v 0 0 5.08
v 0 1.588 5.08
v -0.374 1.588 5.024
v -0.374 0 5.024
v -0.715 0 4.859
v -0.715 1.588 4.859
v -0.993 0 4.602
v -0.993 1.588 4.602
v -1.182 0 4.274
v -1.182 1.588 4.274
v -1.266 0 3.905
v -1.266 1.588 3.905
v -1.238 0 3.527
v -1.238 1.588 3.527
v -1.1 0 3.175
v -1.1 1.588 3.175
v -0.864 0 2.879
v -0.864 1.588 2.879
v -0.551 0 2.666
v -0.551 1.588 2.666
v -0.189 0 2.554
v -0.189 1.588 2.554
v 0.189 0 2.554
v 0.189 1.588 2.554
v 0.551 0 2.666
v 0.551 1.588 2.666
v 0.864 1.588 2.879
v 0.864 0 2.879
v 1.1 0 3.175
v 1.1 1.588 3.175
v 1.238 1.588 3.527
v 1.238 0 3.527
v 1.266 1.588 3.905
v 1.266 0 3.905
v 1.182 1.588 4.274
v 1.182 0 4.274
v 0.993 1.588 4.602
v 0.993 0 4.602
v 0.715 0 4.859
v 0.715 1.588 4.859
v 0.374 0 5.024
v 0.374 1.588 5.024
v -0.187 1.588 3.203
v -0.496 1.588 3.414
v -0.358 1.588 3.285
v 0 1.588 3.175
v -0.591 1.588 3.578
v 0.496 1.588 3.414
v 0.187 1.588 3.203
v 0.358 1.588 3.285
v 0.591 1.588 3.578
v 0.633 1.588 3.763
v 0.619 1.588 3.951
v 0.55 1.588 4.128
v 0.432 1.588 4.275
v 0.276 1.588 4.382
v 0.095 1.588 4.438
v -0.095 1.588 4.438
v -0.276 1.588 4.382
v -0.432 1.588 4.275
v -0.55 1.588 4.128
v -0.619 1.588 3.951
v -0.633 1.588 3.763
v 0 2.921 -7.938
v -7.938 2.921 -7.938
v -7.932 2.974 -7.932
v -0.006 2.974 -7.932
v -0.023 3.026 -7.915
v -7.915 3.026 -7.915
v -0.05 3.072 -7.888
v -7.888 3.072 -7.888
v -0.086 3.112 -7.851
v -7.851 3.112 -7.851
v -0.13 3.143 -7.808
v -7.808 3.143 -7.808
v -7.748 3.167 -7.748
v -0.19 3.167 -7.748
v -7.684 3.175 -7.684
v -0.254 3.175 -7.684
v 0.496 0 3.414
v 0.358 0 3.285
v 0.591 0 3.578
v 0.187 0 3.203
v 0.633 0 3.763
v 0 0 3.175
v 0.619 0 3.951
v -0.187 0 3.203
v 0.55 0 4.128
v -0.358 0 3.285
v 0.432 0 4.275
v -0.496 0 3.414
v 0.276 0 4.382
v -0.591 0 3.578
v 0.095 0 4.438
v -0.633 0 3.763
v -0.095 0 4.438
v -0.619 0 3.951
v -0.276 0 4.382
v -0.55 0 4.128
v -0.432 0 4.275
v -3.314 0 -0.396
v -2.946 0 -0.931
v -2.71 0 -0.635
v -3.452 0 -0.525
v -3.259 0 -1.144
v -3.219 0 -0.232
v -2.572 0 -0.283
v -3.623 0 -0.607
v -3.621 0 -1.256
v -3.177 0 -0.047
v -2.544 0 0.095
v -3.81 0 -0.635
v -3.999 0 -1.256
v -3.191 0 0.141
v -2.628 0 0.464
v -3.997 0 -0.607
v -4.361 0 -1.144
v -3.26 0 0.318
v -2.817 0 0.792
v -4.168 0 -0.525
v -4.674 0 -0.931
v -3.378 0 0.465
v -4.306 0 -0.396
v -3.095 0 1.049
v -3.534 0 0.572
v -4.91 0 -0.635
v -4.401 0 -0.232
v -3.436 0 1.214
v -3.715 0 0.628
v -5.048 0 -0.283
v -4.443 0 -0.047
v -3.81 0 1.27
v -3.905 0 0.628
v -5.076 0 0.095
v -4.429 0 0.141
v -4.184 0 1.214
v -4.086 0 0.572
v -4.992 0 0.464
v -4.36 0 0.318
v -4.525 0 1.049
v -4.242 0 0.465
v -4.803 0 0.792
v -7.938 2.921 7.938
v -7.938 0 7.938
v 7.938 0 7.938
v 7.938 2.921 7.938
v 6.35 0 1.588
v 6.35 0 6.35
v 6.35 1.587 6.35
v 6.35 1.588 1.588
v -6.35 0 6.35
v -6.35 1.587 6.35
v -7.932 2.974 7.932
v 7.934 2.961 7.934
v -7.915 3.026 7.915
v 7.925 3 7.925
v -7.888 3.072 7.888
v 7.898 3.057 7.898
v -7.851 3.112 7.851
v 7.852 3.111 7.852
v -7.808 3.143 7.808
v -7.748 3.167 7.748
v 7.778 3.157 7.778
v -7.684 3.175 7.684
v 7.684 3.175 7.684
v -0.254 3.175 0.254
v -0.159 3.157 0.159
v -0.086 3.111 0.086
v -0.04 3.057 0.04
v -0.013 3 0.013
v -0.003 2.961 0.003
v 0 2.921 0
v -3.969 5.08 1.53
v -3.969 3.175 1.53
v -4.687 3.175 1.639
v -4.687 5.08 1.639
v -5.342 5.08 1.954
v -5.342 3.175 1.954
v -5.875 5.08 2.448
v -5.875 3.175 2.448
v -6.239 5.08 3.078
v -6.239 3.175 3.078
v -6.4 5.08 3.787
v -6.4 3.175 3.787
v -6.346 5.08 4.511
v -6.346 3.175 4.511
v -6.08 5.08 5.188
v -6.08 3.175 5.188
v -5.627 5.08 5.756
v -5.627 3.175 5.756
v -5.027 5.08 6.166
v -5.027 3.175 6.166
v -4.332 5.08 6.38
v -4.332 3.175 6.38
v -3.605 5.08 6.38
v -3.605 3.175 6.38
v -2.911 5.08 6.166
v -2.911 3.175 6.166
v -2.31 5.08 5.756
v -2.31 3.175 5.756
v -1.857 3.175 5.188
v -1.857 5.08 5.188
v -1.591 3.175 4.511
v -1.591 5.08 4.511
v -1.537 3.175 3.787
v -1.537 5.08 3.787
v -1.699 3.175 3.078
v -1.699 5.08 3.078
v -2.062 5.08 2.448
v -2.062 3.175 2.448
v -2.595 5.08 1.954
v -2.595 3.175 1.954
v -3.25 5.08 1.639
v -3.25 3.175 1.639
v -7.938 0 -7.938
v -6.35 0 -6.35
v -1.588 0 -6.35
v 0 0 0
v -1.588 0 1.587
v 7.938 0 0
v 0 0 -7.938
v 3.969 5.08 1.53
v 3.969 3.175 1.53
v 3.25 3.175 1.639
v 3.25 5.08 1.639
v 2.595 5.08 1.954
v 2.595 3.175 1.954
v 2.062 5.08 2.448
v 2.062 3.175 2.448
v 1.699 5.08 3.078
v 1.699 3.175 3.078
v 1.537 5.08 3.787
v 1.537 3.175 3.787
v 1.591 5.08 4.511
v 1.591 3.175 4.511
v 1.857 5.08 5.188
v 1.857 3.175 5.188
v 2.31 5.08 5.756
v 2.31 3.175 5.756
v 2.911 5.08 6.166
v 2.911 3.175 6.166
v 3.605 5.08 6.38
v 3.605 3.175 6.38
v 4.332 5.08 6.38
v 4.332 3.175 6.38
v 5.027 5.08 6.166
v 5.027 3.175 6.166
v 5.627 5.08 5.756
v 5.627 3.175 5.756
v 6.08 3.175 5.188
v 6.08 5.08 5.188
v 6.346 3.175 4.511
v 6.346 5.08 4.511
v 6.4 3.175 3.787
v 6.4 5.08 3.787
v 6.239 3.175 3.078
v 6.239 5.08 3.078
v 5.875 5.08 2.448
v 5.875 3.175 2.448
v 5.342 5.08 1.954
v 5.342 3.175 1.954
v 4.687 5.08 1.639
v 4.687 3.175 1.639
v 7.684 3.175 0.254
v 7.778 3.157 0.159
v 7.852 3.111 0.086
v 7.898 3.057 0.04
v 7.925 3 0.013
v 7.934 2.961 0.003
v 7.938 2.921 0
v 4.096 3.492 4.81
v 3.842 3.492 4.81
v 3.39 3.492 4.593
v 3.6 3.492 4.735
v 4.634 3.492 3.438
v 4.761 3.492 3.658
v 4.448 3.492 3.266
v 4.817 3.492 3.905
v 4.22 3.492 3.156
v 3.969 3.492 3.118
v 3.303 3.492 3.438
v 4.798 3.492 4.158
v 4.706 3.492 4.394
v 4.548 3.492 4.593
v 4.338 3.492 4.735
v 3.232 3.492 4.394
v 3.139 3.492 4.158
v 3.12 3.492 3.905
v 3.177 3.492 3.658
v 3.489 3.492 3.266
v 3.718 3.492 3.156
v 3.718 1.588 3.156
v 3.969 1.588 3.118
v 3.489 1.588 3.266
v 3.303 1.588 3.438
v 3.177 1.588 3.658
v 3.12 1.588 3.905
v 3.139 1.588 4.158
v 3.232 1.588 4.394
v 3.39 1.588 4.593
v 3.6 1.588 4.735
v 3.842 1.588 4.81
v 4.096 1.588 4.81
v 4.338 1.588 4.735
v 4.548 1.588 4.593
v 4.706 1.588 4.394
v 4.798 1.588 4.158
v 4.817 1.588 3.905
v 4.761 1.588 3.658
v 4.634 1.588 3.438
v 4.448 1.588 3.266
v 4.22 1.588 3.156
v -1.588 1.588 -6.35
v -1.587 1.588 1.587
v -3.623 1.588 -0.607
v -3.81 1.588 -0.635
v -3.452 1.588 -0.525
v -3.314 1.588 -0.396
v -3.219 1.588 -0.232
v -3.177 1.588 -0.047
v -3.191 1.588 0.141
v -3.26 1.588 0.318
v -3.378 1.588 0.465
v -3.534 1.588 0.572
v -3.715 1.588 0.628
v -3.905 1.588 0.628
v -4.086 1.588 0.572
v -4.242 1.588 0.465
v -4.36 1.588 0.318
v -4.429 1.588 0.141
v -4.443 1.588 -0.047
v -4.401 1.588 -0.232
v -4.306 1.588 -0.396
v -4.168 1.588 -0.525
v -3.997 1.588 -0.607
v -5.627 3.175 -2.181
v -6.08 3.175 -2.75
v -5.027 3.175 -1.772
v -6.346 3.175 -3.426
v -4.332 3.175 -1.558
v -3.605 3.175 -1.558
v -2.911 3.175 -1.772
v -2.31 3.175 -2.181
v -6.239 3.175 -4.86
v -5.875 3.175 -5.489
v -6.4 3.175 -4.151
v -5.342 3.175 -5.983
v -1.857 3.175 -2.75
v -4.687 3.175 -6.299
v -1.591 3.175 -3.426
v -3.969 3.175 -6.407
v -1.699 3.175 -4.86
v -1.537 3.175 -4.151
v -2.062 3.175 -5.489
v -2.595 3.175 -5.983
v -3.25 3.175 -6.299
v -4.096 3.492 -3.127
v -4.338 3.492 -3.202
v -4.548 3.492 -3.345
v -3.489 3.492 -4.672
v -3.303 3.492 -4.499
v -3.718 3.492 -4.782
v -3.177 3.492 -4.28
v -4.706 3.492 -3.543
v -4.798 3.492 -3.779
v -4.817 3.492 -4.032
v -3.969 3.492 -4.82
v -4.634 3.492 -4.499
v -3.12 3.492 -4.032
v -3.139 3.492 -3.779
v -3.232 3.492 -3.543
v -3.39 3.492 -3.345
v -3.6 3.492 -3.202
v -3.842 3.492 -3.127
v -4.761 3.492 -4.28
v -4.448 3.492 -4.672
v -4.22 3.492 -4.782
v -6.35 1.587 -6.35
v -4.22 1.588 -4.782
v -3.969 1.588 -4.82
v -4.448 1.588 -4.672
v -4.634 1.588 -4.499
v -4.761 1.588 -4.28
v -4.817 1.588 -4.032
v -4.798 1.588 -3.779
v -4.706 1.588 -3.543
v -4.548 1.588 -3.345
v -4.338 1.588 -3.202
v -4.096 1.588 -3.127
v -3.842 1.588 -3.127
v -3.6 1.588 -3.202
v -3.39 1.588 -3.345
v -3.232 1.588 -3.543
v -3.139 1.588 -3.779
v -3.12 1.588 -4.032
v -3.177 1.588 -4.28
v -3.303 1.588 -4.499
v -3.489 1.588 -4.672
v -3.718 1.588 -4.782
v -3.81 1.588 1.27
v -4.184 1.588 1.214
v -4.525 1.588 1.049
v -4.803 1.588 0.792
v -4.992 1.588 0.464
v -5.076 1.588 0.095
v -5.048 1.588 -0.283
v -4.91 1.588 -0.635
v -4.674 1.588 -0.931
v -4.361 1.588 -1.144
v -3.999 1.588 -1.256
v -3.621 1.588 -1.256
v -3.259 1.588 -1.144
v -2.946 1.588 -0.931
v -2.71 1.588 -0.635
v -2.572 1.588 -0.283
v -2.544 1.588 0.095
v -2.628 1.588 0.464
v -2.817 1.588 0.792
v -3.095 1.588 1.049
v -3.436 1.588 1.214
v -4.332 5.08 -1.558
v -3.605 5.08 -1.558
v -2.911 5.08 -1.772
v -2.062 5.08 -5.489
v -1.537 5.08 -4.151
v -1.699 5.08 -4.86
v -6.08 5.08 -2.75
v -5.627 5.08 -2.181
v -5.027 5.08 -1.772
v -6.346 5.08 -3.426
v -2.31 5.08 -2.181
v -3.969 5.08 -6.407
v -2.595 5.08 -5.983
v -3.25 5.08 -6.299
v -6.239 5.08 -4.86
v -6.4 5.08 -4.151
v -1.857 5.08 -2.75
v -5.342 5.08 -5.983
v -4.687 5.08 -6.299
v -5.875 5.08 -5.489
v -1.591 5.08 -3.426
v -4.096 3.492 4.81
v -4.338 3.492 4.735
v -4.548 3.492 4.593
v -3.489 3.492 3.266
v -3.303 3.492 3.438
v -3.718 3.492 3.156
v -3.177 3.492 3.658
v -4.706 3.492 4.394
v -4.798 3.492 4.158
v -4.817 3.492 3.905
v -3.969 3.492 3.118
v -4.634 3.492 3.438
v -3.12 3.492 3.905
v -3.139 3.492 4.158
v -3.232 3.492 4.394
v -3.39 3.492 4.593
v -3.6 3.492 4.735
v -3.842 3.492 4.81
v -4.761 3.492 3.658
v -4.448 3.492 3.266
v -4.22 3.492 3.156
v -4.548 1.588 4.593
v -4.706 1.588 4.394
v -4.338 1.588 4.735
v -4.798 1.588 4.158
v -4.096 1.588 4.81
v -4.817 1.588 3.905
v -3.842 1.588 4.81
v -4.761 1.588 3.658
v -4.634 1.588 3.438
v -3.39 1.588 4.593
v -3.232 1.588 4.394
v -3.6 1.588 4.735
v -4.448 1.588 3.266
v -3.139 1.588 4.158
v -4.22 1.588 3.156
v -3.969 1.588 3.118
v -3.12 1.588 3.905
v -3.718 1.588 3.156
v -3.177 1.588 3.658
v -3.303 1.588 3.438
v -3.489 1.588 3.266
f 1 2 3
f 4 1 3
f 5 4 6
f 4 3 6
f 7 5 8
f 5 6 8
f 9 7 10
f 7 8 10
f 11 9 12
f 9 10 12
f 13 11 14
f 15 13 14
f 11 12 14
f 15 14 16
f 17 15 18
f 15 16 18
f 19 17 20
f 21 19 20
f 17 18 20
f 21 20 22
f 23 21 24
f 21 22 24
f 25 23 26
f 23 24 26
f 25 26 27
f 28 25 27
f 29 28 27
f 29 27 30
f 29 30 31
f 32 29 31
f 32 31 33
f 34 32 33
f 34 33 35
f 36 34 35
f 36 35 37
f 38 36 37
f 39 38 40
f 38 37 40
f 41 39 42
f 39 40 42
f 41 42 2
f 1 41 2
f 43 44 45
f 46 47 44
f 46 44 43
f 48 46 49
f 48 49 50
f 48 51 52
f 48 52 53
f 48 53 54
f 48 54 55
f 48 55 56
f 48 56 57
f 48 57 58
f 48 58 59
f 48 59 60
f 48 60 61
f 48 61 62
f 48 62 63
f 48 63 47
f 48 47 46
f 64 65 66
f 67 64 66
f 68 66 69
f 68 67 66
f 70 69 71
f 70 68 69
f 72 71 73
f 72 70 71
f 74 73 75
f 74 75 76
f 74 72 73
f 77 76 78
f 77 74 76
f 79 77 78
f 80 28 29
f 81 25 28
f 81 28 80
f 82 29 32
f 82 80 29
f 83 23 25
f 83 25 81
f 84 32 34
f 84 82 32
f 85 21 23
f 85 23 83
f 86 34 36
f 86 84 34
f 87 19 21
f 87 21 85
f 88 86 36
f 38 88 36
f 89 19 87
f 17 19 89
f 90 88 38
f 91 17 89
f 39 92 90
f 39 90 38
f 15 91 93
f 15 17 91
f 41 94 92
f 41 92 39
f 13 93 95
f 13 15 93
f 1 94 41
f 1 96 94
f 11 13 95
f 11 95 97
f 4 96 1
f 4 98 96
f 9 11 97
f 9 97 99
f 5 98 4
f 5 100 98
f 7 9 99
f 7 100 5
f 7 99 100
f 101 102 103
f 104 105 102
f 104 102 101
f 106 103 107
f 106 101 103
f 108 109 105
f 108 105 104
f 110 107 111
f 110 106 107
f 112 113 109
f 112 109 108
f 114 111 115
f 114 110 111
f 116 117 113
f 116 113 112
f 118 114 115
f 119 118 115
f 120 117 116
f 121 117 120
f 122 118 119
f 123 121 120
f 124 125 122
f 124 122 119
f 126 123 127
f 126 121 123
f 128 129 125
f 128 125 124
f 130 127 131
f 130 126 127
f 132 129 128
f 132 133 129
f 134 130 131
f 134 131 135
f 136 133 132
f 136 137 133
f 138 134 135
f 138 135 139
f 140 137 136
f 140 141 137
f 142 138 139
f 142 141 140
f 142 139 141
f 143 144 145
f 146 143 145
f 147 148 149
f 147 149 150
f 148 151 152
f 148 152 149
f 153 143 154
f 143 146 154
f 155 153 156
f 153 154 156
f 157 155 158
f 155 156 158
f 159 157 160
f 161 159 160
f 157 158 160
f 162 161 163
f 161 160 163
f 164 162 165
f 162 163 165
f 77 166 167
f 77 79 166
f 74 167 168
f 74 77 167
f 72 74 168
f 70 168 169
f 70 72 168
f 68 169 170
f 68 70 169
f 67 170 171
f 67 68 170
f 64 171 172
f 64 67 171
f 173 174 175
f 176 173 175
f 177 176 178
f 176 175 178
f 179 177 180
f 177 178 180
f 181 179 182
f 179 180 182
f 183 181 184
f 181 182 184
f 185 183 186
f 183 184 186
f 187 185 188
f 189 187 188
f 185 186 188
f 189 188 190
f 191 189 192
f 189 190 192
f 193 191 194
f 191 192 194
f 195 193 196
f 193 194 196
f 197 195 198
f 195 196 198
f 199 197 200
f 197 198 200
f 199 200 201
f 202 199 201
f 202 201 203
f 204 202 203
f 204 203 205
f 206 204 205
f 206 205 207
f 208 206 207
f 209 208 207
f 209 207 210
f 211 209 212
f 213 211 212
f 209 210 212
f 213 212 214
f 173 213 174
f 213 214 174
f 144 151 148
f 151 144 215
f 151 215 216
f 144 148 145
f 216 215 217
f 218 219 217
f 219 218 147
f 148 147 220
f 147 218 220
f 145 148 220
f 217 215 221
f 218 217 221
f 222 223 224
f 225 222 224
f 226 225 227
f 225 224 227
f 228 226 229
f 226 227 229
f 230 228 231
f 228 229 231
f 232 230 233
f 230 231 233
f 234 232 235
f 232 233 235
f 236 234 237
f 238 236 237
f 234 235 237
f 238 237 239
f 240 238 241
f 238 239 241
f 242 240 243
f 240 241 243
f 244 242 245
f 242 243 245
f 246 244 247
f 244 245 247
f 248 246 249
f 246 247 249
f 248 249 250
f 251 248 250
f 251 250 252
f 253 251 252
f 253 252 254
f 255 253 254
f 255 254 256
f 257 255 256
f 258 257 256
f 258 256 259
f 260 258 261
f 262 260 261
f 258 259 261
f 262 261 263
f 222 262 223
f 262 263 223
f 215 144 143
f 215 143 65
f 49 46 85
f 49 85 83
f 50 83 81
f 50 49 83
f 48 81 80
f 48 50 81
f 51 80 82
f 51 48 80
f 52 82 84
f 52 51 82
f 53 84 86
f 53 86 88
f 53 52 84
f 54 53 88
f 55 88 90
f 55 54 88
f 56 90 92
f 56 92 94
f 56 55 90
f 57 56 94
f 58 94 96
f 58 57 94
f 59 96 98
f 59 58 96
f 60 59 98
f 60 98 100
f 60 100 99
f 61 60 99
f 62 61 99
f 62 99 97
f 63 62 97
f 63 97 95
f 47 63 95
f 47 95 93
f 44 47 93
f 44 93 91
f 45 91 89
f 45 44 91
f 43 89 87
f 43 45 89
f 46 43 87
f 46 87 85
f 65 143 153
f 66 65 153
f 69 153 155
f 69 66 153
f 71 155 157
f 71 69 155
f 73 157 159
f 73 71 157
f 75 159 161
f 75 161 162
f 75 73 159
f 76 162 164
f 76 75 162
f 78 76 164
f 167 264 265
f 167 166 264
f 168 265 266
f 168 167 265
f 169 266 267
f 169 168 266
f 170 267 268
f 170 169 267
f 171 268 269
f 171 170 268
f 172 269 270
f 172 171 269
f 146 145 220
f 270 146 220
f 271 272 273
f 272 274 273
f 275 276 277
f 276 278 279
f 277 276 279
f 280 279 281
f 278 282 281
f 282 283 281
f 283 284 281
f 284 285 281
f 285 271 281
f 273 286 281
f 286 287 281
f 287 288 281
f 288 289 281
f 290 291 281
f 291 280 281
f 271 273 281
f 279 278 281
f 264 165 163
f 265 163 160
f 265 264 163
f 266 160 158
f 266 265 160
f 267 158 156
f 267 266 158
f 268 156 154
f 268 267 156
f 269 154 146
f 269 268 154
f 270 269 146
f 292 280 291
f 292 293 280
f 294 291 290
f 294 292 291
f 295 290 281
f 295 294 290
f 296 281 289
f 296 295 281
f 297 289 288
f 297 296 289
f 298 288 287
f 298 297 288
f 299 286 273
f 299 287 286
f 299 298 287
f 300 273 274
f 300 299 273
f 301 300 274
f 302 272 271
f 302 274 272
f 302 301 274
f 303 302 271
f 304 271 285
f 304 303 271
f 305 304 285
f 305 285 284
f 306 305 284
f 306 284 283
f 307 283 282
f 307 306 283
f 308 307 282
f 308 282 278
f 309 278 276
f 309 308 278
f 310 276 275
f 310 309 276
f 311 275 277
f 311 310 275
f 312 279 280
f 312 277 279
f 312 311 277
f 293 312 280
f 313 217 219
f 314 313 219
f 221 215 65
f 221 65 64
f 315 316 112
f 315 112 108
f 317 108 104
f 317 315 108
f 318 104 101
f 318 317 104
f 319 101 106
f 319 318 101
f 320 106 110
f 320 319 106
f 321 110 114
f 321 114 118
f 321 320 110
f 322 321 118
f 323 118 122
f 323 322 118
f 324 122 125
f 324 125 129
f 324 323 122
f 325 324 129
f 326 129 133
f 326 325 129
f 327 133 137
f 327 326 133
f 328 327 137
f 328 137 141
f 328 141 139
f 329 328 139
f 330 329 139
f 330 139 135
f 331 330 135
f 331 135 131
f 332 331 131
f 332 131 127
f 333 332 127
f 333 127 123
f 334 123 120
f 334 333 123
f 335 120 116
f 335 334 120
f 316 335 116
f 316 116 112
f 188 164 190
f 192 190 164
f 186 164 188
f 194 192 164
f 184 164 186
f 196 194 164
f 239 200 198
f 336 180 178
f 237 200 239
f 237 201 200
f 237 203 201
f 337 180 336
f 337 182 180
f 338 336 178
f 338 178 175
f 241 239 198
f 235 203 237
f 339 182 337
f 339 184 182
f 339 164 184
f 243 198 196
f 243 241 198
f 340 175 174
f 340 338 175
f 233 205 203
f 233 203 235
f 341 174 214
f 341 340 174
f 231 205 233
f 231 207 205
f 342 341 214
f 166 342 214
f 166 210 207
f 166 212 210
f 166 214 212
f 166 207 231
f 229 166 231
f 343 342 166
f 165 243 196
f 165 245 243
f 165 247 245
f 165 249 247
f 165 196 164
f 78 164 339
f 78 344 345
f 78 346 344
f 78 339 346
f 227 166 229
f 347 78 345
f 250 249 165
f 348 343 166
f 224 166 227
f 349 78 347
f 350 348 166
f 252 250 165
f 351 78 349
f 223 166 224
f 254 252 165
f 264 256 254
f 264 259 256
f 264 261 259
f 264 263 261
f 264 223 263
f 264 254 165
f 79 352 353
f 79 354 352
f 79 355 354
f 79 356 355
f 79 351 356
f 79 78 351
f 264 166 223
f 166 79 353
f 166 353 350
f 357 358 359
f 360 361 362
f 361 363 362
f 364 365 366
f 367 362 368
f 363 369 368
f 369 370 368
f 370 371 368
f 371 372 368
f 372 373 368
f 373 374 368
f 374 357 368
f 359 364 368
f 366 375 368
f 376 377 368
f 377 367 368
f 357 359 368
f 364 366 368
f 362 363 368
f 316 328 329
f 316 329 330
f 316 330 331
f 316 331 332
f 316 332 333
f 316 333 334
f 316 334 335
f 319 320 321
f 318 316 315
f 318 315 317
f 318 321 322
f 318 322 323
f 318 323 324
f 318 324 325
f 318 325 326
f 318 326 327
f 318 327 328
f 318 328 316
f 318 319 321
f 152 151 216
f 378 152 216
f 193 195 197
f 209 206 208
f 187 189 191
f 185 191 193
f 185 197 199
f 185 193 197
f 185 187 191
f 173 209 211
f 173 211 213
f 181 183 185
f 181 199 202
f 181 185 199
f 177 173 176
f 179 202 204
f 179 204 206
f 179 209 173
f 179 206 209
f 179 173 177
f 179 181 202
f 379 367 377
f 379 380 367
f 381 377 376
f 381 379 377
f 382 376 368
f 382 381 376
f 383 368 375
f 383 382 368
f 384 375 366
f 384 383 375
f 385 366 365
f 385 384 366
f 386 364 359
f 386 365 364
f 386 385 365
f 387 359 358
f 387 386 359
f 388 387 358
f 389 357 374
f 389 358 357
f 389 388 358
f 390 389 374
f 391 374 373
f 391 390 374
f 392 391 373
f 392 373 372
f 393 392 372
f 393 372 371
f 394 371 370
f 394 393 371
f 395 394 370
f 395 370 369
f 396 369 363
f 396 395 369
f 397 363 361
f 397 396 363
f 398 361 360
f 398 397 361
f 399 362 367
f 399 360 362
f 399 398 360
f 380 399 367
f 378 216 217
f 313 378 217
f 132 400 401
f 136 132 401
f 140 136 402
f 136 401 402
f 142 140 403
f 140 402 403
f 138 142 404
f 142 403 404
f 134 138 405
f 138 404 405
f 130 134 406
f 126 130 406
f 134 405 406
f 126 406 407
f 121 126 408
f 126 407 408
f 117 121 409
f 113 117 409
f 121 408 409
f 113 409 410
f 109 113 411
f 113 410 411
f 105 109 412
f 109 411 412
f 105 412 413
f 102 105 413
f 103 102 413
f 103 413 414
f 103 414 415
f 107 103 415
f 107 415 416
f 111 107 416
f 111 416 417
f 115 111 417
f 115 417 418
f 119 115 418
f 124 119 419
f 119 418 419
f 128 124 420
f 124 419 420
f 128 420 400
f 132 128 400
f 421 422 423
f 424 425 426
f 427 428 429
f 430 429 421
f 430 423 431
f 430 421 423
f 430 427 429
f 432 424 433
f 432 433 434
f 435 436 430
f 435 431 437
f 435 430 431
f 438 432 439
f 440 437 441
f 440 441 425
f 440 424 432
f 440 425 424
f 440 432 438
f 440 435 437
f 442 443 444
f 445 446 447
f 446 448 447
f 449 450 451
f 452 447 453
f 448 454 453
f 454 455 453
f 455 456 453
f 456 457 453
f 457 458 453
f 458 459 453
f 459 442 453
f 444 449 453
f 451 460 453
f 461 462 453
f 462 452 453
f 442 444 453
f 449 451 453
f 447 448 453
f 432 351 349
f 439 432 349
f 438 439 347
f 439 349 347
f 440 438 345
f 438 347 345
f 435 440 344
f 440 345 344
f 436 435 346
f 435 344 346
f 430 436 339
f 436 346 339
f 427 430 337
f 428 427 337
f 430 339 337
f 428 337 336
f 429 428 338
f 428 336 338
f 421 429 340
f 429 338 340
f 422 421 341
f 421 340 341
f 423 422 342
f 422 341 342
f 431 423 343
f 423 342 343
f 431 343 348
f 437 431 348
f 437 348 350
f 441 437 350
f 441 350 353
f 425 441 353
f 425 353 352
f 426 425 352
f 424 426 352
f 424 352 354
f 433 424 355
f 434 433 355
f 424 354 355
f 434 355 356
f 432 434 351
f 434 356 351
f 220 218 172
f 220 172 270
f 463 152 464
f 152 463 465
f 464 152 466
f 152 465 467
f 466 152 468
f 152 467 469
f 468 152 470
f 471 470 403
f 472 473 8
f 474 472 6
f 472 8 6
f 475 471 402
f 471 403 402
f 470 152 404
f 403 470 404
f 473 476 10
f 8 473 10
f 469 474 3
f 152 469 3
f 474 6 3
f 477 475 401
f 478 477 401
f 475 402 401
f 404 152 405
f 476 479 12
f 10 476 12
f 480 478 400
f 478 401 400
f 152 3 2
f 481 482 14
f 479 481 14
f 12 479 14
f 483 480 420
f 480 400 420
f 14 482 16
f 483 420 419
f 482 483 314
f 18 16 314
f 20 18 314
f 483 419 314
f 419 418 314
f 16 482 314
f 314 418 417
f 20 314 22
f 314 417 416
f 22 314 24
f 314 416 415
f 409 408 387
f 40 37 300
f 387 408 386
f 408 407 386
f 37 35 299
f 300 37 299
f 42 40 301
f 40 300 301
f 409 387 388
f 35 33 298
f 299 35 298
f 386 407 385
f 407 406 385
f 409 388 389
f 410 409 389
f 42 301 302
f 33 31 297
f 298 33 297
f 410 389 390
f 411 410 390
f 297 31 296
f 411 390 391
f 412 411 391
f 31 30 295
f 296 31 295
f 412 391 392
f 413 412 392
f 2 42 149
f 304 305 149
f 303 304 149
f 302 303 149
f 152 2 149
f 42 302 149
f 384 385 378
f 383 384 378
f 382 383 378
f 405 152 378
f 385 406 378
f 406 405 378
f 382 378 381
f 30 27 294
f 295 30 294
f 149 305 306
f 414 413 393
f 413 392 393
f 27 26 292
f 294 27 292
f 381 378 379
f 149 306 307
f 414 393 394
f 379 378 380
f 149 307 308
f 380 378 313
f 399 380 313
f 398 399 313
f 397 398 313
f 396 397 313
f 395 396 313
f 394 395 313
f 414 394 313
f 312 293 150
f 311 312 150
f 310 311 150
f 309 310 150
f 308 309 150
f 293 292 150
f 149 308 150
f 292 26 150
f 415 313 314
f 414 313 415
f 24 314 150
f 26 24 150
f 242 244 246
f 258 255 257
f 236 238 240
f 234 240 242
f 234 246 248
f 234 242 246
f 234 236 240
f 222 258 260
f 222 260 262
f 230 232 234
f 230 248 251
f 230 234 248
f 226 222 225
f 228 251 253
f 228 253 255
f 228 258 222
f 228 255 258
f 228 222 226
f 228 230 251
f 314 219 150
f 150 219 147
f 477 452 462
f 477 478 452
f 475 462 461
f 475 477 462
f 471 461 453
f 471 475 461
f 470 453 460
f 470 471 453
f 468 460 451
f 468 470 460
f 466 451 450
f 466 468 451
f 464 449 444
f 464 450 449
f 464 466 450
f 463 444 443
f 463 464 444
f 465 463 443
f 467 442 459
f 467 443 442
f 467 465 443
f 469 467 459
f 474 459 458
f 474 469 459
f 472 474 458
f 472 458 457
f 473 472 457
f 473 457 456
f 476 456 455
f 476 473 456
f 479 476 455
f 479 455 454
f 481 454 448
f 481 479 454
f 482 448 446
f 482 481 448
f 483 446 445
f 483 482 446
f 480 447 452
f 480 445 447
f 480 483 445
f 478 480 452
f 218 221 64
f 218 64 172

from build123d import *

# Parameters (mm, degrees)
SKETCH1_W               = 15.875
SKETCH1_H               = 15.875
BASE_EXTRUDE_DEPTH      = 3.175
SKETCH2_R               = 2.4384
BOSS_EXTRUDE1_DEPTH     = 1.905
LPATTERN4_COUNT         = 2
LPATTERN4_PITCH         = 7.9375
LPATTERN4_COUNT_DIR2    = 2
LPATTERN4_PITCH_DIR2    = 7.9375
CUT_EXTRUDE1_DEPTH      = 7.9375
CUT_EXTRUDE1_DEPTH_BACK = 12.6656949
SHELL1_T                = -1.5875
SKETCH4_R               = 1.27
BOSS_EXTRUDE2_DEPTH     = 1.5875
CUT_EXTRUDE2_START      = -1.5875
SKETCH5_R               = 0.635
CUT_EXTRUDE2_DEPTH      = 1.5875
FILLET1_R               = 0.254


with BuildPart() as part:
    # Sketch1 → Base-Extrude (new body)
    with BuildSketch(Plane(origin=(0, 0, 0), x_dir=(1, 0, 0), z_dir=(0, 1, 0))):
        Rectangle(SKETCH1_W, SKETCH1_H)
    extrude(amount=BASE_EXTRUDE_DEPTH)

    # Sketch2 → Boss-Extrude1 (add)
    with BuildSketch(Plane(origin=(0, 3.175, 0), x_dir=(-1, 0, 0), z_dir=(0, 1, 0))):
        with Locations(Location((3.96875, 3.96875, 0), (0, 0, 270))):
            Circle(SKETCH2_R)
    boss_extrude1 = extrude(amount=BOSS_EXTRUDE1_DEPTH)

    # LPattern4: Boss-Extrude1 2 × 2
    with Locations(*[(i * LPATTERN4_PITCH, 0, -j * LPATTERN4_PITCH_DIR2) for i in range(LPATTERN4_COUNT) for j in range(LPATTERN4_COUNT_DIR2) if (i, j) != (0, 0)]):
        add(boss_extrude1)

    # Sketch3 → Cut-Extrude1 (cut, two sides: drawn at the far end of the back side and taken through both)
    with BuildSketch(Plane(origin=(0, 3.175, 0), x_dir=(-1, 0, 0), z_dir=(0, 1, 0)).offset(-CUT_EXTRUDE1_DEPTH_BACK)):
        Polygon((0, -53.435079143), (0, -7.9375), (0, 0), (-7.9375, 0), (-53.435079143, 0), (-117.778372622, -64.343293479), (-64.343293479, -117.778372622), align=None)
    extrude(amount=CUT_EXTRUDE1_DEPTH + CUT_EXTRUDE1_DEPTH_BACK, mode=Mode.SUBTRACT)

    # Shell1
    shell1_openings = [part.faces().sort_by_distance(p)[0] for p in [
        (-1.322916667, 0, 1.322916667),
    ]]
    offset(amount=SHELL1_T, openings=shell1_openings, kind=Kind.INTERSECTION)

    # Sketch4 → Boss-Extrude2 (add)
    with BuildSketch(Plane.XZ.offset(-1.5875)):
        with Locations(Location((-3.81, 0, 0), (0, 0, 90))):
            Circle(SKETCH4_R)
        with Locations(Location((0, 3.81, 0), (0, 0, 90))):
            Circle(SKETCH4_R)
    extrude(amount=BOSS_EXTRUDE2_DEPTH)

    # Sketch5 → Cut-Extrude2 (cut)
    with BuildSketch(Plane.XZ.offset(CUT_EXTRUDE2_START)):
        with Locations(Location((0, 3.81, 0), (0, 0, 270))):
            Circle(SKETCH5_R)
        with Locations(Location((-3.81, 0, 0), (0, 0, 270))):
            Circle(SKETCH5_R)
    extrude(amount=CUT_EXTRUDE2_DEPTH, mode=Mode.SUBTRACT)

    # Fillet1
    fillet1_edges = [part.edges().sort_by_distance(p)[0] for p in [
        (7.9375, 3.175, 3.96875),
        (-3.96875, 3.175, -7.9375),
        (0, 3.175, -3.96875),
        (3.96875, 3.175, 0),
        (-7.9375, 3.175, 0),
        (0, 3.175, 7.9375),
    ]]
    fillet(fillet1_edges, radius=FILLET1_R)


solid = part.part
